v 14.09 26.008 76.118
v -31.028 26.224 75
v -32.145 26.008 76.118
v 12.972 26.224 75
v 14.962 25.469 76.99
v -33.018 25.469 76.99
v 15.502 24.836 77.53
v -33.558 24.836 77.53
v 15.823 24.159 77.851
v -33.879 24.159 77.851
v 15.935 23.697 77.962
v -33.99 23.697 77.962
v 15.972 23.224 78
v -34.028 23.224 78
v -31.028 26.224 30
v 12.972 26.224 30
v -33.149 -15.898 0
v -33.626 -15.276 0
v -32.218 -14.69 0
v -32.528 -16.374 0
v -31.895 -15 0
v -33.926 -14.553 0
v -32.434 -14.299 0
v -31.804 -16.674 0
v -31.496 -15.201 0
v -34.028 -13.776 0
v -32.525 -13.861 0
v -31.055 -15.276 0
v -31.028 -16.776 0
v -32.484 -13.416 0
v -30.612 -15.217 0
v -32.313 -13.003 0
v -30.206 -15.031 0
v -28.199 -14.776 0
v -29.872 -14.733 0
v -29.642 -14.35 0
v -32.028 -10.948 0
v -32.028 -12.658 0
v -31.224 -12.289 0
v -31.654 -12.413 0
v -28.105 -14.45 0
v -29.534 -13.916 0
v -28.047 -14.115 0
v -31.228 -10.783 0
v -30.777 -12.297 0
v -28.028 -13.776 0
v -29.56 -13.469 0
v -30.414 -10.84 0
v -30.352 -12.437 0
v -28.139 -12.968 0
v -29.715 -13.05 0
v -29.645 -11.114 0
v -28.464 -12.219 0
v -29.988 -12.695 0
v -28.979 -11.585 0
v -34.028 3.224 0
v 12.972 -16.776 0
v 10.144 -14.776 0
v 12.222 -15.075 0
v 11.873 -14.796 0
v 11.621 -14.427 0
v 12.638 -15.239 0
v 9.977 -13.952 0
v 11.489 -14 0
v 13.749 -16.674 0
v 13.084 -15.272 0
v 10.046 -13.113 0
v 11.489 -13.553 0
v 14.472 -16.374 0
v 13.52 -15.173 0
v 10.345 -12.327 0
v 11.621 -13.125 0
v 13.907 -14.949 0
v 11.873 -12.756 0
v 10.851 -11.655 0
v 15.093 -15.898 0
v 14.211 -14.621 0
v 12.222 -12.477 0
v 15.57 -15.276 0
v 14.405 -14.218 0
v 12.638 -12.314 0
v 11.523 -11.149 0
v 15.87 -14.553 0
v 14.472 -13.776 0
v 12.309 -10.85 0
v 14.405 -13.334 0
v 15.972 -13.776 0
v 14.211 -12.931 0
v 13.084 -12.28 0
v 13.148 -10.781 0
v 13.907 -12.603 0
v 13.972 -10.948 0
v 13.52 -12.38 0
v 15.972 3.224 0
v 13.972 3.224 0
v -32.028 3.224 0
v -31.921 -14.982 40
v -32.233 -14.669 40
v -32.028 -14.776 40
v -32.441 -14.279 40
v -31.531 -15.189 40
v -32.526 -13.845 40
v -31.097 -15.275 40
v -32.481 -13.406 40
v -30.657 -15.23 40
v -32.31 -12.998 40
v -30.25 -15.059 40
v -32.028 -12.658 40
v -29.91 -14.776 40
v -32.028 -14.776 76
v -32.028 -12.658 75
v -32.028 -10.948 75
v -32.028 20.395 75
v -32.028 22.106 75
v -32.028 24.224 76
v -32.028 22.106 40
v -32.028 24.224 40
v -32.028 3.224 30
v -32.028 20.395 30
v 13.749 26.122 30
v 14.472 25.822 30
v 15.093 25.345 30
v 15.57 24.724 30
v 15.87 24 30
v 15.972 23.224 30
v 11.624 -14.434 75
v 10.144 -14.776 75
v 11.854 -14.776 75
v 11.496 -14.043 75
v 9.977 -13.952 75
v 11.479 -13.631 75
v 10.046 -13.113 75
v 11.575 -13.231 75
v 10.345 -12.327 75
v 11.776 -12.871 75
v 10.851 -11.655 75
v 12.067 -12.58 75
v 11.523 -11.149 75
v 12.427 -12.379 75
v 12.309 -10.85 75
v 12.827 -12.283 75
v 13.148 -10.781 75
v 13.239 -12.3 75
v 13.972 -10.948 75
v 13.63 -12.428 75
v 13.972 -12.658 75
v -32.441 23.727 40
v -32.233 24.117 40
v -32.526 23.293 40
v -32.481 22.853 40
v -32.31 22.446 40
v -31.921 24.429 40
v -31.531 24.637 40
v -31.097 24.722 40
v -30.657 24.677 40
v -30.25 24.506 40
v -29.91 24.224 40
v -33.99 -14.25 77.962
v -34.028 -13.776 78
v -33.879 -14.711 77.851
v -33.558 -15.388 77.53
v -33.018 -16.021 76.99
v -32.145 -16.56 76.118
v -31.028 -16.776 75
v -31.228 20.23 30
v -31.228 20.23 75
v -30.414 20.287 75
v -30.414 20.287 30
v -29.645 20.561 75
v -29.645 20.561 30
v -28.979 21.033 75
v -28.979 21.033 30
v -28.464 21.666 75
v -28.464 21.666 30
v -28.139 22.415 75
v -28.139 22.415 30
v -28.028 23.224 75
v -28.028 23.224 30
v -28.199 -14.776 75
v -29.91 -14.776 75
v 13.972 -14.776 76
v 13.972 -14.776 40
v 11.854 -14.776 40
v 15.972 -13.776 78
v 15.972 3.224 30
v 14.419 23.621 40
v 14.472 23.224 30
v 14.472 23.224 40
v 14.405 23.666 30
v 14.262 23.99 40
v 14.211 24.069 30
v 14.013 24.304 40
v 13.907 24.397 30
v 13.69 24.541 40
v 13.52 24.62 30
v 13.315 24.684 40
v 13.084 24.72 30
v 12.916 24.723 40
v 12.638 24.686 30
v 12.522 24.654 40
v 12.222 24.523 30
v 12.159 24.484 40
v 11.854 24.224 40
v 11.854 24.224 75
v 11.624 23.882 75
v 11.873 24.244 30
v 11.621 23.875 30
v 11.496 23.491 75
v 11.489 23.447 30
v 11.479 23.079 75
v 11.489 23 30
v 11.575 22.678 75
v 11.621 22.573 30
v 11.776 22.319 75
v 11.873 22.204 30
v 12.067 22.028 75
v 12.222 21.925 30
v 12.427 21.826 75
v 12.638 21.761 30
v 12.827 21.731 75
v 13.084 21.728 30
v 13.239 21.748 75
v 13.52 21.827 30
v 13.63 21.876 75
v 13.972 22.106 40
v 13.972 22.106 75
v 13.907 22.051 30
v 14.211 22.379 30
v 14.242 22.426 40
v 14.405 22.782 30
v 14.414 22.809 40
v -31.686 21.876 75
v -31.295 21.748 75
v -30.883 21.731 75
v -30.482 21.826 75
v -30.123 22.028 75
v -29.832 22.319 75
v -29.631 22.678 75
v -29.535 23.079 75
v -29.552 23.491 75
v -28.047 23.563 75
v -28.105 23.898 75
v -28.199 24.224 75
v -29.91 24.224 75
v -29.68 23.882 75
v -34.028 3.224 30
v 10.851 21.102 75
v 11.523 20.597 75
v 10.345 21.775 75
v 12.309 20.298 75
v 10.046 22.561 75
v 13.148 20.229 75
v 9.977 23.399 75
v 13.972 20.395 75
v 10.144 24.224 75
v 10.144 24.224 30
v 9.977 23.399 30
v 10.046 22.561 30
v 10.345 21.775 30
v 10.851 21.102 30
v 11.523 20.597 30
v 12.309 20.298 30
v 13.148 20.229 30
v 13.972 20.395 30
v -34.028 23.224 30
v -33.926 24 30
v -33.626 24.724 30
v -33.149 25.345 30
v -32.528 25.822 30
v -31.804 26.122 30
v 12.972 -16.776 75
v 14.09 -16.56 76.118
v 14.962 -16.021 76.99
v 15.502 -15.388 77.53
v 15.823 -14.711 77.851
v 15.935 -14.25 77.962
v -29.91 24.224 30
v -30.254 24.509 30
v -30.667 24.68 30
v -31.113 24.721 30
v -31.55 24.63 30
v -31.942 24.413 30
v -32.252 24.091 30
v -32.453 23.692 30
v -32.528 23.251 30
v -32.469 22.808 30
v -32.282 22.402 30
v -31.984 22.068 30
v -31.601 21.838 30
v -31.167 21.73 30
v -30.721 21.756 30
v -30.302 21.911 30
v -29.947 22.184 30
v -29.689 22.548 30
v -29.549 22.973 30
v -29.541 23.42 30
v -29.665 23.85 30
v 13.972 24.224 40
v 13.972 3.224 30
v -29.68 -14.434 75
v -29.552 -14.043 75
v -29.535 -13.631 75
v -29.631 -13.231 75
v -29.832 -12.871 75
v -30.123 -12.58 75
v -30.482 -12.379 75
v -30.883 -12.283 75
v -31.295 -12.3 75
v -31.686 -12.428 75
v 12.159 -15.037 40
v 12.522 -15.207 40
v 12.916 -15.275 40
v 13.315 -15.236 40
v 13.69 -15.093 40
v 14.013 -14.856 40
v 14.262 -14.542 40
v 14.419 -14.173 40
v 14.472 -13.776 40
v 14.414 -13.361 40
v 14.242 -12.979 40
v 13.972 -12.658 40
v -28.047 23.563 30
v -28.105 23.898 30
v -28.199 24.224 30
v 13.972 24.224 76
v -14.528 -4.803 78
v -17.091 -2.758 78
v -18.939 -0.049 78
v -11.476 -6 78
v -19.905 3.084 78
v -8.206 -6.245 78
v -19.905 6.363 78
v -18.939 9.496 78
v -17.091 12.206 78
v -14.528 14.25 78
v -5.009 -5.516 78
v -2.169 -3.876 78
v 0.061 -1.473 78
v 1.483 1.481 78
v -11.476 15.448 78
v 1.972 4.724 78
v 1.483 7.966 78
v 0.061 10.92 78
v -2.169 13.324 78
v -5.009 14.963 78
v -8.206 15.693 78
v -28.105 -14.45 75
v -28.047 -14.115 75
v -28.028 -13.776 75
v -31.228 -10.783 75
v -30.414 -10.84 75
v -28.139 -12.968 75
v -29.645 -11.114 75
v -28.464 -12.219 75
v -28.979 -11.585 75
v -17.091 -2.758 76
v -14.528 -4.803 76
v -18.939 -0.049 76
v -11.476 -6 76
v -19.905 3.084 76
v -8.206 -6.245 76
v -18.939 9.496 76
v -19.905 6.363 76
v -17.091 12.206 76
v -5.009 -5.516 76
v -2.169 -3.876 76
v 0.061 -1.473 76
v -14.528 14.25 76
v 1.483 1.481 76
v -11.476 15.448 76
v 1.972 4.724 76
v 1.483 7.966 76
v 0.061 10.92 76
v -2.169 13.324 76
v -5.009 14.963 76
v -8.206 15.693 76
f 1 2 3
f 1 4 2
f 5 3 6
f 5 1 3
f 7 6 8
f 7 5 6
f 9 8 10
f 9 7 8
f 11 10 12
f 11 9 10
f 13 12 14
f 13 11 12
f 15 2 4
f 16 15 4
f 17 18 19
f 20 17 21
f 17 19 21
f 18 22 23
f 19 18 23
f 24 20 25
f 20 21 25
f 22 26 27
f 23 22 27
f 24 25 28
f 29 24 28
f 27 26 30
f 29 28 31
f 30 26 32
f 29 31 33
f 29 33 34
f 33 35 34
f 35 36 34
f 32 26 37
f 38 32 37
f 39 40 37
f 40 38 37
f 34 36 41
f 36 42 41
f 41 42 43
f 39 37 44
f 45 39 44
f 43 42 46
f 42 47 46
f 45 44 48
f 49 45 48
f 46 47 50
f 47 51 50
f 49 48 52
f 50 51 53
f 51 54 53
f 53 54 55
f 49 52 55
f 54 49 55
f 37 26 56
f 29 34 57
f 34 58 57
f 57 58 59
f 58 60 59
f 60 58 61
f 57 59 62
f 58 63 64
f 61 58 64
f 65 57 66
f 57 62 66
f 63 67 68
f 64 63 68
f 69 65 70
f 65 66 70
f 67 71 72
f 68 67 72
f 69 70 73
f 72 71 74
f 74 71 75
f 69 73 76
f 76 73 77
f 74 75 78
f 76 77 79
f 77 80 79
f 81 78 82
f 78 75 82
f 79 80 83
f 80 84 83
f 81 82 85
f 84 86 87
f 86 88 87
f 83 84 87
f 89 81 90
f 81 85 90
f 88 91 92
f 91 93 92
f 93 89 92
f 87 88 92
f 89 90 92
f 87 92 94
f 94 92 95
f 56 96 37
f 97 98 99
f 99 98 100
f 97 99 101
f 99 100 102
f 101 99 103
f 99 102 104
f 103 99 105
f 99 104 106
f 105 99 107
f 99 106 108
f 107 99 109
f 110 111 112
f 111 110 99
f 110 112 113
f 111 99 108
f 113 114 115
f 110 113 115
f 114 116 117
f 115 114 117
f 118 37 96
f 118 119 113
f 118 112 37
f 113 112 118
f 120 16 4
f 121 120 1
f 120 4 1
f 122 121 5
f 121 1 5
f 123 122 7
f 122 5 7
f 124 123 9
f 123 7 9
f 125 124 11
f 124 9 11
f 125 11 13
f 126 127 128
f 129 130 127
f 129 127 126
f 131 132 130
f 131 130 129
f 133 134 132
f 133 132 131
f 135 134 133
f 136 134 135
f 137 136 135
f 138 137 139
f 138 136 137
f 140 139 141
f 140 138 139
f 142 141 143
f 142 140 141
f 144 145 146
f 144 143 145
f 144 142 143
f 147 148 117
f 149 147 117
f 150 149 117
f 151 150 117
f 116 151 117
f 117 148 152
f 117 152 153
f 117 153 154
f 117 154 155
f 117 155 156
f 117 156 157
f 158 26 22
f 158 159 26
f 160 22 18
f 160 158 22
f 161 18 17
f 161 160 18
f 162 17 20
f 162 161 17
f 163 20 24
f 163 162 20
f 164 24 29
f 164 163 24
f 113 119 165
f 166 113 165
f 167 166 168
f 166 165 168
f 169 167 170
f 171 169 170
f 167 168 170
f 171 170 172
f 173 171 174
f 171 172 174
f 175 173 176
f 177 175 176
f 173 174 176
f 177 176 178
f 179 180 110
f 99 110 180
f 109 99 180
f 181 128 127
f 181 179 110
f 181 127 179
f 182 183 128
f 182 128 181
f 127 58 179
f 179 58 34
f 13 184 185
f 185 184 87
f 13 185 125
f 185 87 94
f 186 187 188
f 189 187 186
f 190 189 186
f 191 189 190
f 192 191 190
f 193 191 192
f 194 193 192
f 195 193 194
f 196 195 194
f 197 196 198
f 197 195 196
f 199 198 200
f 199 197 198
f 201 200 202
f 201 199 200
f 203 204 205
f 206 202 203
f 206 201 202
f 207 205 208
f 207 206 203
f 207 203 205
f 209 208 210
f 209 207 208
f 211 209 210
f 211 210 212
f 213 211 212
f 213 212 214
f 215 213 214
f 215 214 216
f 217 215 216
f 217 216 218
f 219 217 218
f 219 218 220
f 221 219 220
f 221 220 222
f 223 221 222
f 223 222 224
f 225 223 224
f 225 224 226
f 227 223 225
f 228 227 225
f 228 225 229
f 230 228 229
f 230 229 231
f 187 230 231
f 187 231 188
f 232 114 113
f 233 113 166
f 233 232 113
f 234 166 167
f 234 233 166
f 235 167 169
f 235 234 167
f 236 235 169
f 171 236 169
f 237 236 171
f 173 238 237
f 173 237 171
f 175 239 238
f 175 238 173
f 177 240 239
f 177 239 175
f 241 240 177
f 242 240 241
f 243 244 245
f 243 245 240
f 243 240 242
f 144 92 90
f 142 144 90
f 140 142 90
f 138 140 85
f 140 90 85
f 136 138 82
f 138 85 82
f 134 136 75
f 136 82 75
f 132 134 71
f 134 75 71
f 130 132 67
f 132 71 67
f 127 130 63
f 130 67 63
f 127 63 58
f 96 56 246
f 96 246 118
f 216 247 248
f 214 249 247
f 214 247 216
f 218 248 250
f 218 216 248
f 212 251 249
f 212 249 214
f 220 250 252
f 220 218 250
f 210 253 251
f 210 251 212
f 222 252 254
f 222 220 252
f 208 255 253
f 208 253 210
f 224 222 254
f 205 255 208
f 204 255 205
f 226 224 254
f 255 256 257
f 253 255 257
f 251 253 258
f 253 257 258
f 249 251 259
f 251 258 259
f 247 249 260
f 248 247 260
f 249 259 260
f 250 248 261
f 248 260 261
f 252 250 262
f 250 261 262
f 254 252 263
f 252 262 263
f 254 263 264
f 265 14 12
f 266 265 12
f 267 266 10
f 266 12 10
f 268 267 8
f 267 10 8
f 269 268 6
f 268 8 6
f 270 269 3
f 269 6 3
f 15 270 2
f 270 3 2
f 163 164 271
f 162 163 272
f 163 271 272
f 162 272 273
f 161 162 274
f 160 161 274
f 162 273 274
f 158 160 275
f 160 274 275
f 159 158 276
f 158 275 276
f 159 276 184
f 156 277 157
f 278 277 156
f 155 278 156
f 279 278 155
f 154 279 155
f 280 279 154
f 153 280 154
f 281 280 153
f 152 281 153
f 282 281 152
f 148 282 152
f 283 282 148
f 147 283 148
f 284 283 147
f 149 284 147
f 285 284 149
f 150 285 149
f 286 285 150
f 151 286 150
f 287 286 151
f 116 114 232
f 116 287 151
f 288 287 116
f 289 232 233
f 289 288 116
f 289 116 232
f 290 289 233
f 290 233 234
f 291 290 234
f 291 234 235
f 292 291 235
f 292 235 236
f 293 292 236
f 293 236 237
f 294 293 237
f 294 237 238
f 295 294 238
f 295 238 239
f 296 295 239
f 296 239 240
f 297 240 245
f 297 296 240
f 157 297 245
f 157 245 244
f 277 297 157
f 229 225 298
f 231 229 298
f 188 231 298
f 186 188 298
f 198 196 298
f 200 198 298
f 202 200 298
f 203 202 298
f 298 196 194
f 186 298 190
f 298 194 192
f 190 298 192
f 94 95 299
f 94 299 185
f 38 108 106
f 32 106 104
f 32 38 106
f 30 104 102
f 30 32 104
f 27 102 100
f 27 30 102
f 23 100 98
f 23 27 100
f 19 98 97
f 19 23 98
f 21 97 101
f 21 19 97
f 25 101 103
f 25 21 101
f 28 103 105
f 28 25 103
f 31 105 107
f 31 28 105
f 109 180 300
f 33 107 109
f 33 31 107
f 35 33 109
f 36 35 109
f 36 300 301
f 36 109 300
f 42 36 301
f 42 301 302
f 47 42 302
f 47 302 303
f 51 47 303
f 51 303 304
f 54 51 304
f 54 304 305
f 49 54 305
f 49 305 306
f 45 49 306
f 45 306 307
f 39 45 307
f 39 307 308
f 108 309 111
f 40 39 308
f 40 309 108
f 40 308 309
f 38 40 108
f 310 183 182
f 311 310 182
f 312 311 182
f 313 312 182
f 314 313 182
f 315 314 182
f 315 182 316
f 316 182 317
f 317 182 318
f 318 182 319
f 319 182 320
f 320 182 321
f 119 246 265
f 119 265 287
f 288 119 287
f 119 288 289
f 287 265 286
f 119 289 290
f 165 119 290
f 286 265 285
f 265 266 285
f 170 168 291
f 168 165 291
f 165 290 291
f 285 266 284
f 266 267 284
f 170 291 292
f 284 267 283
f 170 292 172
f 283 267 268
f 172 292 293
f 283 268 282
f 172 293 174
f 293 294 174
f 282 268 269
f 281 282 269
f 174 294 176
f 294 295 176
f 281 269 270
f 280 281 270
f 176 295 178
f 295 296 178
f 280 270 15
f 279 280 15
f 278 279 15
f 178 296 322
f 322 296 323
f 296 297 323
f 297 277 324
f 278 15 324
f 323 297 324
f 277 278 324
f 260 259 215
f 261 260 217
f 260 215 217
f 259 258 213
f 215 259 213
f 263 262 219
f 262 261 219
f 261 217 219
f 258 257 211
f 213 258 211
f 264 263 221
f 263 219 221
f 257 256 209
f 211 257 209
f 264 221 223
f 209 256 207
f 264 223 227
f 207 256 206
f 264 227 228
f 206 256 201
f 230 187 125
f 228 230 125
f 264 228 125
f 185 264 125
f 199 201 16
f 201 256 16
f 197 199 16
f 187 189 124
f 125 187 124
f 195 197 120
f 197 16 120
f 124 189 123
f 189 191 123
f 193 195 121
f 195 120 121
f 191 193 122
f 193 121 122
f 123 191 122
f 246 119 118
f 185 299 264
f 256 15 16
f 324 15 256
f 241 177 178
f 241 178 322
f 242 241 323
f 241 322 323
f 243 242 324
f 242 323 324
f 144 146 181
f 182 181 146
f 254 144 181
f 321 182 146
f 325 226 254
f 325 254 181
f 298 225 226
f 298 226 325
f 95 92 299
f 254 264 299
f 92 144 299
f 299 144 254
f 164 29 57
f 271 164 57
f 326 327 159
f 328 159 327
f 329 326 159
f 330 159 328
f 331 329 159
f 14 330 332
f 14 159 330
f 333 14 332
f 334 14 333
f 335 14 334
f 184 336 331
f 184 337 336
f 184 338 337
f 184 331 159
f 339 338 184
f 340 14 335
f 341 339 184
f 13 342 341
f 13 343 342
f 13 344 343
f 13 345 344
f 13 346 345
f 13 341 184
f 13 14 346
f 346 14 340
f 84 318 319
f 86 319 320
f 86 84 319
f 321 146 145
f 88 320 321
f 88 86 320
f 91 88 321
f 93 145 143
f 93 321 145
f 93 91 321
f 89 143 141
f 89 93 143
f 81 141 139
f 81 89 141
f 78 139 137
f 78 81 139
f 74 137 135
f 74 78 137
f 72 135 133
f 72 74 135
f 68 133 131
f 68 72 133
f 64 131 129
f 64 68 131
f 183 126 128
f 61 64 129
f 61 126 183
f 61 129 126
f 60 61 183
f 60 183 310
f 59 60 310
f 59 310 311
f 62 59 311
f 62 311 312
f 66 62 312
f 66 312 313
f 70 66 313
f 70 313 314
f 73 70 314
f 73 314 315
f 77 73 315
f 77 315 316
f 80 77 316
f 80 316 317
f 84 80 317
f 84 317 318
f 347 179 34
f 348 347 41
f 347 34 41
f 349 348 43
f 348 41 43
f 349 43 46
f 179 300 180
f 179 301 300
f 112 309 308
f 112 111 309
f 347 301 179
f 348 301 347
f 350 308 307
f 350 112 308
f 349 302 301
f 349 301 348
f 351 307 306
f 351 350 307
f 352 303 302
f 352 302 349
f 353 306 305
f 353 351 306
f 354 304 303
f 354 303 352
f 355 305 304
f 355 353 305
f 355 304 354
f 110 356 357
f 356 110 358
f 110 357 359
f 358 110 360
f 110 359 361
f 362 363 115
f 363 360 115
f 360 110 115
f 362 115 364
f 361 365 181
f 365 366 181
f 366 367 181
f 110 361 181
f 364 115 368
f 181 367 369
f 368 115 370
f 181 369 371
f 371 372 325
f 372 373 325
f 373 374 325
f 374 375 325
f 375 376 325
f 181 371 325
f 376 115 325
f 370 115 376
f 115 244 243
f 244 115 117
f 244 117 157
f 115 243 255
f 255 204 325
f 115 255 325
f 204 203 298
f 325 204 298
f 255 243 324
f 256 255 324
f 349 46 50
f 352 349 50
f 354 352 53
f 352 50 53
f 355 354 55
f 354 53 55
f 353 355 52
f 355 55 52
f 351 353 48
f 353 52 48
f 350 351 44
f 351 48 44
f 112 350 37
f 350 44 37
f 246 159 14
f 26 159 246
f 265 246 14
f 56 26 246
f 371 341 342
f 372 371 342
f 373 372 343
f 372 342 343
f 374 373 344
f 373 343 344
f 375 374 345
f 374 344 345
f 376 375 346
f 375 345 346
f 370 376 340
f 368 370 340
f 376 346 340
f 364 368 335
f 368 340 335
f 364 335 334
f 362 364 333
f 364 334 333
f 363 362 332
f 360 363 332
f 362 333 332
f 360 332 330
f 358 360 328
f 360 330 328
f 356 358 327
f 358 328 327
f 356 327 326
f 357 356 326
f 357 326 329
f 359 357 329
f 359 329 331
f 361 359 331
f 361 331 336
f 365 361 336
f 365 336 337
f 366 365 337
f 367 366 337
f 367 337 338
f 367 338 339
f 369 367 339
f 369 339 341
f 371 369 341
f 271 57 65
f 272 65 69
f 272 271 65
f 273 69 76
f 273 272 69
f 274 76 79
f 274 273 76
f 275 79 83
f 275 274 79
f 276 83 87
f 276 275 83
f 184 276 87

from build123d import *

# Parameters (mm, degrees)
F0_W      = 50
F0_H      = 43
F0_R      = 1.5
F1_DEPTH  = 78
F3_T      = -2
F2_R      = 11
F4_DEPTH  = 3.1
F5_R      = 3
F6_R      = 1.5
F7_DEPTH  = 75
F8_DEPTH  = 40
F9_W      = 50
F9_H      = 23
F10_DEPTH = 30


# Not quite as in the source:
# - a feature names something its author has since deleted; it is built from what else it names


with BuildPart() as f1:
    # F0 (on Top) → F1 (new body)
    with BuildSketch(Plane.XY):
        with Locations((-9.0278687937, 4.7237686813)):
            Rectangle(F0_W, F0_H)
        with Locations((-31.0278687937, -13.7762313187)):
            Circle(F0_R, mode=Mode.SUBTRACT)
        with Locations((12.9721312063, -13.7762313187)):
            Circle(F0_R, mode=Mode.SUBTRACT)
        with Locations((-31.0278687937, 23.2237686813)):
            Circle(F0_R, mode=Mode.SUBTRACT)
        with Locations((12.9721312063, 23.2237686813)):
            Circle(F0_R, mode=Mode.SUBTRACT)
        with Locations((12.9721312063, 23.2237686813)):
            Circle(F0_R)
        with Locations((12.9721312063, -13.7762313187)):
            Circle(F0_R)
        with Locations((-31.0278687937, -13.7762313187)):
            Circle(F0_R)
        with Locations((-31.0278687937, 23.2237686813)):
            Circle(F0_R)
    extrude(amount=F1_DEPTH)

    # F3
    f3_openings = [f1.faces().sort_by_distance(p)[0] for p in [
        (-9.027869, 4.723769, 0),
    ]]
    offset(amount=F3_T, openings=f3_openings)

    # F2 (on face) → F4 (cut)
    with BuildSketch(Plane.XY.offset(78)):
        with Locations((-9.0278687937, 4.7237686813)):
            Circle(F2_R)
    extrude(amount=-F4_DEPTH, mode=Mode.SUBTRACT)

    # F5
    f5_edges = [f1.edges().sort_by_distance(p)[0] for p in [
        (15.972131, 26.223769, 39),
        (-9.027869, 26.223769, 78),
        (-34.027869, 26.223769, 39),
        (15.972131, -16.776231, 39),
        (-9.027869, -16.776231, 78),
        (-34.027869, -16.776231, 39),
    ]]
    fillet(f5_edges, radius=F5_R)

    # F6 (on face) → F7 (join)
    with BuildSketch(Plane.XY):
        with BuildLine():
            ThreePointArc((12.9721312104, -16.7762313187), (15.0934515513, -15.8975516608), (15.9721312063, -13.7762313187))
            ThreePointArc((15.9721312063, -13.7762313187), (10.8508108613, -11.6549109766), (12.9721312104, -16.7762313187))
        make_face()
        with Locations((12.9721312063, -13.7762313187)):
            Circle(F6_R, mode=Mode.SUBTRACT)
        with BuildLine():
            ThreePointArc((12.9721312063, 26.2237686813), (10.8508108627, 21.1024483377), (15.9721312063, 23.2237686813))
            ThreePointArc((15.9721312063, 23.2237686813), (15.0934515498, 25.3450890248), (12.9721312063, 26.2237686813))
        make_face()
        with Locations((12.9721312063, 23.2237686813)):
            Circle(F6_R, mode=Mode.SUBTRACT)
        with BuildLine():
            ThreePointArc((-34.0278687937, -13.776231286), (-33.1491891488, -15.8975516507), (-31.0278687937, -16.7762313187))
            ThreePointArc((-31.0278687937, -16.7762313187), (-28.9065484502, -15.8975516623), (-28.0278687937, -13.7762313187))
            ThreePointArc((-28.0278687937, -13.7762313187), (-31.0278687774, -10.7762313187), (-34.0278687937, -13.776231286))
        make_face()
        with Locations((-31.0278687937, -13.7762313187)):
            Circle(F6_R, mode=Mode.SUBTRACT)
        with BuildLine():
            ThreePointArc((-28.0278687937, 23.2237686813), (-28.9065484366, 25.3450890113), (-31.0278687555, 26.2237686813))
            ThreePointArc((-31.0278687555, 26.2237686813), (-33.1491891237, 25.3450890384), (-34.0278687937, 23.2237686813))
            ThreePointArc((-34.0278687937, 23.2237686813), (-31.0278687937, 20.2237686813), (-28.0278687937, 23.2237686813))
        make_face()
        with Locations((-31.0278687937, 23.2237686813)):
            Circle(F6_R, mode=Mode.SUBTRACT)
    extrude(amount=F7_DEPTH)

    # F0 (on Top) → F8 (cut)
    with BuildSketch(Plane.XY):
        with Locations((-31.0278687937, 23.2237686813)):
            Circle(F0_R)
        with Locations((12.9721312063, 23.2237686813)):
            Circle(F0_R)
        with Locations((-31.0278687937, -13.7762313187)):
            Circle(F0_R)
        with Locations((12.9721312063, -13.7762313187)):
            Circle(F0_R)
    extrude(amount=F8_DEPTH, mode=Mode.SUBTRACT)

    # F9 (on Top) → F10 (cut)
    with BuildSketch(Plane.XY):
        with Locations((-9.0278687937, 14.7237686813)):
            Rectangle(F9_W, F9_H)
    extrude(amount=F10_DEPTH, mode=Mode.SUBTRACT)


solid = f1.part
